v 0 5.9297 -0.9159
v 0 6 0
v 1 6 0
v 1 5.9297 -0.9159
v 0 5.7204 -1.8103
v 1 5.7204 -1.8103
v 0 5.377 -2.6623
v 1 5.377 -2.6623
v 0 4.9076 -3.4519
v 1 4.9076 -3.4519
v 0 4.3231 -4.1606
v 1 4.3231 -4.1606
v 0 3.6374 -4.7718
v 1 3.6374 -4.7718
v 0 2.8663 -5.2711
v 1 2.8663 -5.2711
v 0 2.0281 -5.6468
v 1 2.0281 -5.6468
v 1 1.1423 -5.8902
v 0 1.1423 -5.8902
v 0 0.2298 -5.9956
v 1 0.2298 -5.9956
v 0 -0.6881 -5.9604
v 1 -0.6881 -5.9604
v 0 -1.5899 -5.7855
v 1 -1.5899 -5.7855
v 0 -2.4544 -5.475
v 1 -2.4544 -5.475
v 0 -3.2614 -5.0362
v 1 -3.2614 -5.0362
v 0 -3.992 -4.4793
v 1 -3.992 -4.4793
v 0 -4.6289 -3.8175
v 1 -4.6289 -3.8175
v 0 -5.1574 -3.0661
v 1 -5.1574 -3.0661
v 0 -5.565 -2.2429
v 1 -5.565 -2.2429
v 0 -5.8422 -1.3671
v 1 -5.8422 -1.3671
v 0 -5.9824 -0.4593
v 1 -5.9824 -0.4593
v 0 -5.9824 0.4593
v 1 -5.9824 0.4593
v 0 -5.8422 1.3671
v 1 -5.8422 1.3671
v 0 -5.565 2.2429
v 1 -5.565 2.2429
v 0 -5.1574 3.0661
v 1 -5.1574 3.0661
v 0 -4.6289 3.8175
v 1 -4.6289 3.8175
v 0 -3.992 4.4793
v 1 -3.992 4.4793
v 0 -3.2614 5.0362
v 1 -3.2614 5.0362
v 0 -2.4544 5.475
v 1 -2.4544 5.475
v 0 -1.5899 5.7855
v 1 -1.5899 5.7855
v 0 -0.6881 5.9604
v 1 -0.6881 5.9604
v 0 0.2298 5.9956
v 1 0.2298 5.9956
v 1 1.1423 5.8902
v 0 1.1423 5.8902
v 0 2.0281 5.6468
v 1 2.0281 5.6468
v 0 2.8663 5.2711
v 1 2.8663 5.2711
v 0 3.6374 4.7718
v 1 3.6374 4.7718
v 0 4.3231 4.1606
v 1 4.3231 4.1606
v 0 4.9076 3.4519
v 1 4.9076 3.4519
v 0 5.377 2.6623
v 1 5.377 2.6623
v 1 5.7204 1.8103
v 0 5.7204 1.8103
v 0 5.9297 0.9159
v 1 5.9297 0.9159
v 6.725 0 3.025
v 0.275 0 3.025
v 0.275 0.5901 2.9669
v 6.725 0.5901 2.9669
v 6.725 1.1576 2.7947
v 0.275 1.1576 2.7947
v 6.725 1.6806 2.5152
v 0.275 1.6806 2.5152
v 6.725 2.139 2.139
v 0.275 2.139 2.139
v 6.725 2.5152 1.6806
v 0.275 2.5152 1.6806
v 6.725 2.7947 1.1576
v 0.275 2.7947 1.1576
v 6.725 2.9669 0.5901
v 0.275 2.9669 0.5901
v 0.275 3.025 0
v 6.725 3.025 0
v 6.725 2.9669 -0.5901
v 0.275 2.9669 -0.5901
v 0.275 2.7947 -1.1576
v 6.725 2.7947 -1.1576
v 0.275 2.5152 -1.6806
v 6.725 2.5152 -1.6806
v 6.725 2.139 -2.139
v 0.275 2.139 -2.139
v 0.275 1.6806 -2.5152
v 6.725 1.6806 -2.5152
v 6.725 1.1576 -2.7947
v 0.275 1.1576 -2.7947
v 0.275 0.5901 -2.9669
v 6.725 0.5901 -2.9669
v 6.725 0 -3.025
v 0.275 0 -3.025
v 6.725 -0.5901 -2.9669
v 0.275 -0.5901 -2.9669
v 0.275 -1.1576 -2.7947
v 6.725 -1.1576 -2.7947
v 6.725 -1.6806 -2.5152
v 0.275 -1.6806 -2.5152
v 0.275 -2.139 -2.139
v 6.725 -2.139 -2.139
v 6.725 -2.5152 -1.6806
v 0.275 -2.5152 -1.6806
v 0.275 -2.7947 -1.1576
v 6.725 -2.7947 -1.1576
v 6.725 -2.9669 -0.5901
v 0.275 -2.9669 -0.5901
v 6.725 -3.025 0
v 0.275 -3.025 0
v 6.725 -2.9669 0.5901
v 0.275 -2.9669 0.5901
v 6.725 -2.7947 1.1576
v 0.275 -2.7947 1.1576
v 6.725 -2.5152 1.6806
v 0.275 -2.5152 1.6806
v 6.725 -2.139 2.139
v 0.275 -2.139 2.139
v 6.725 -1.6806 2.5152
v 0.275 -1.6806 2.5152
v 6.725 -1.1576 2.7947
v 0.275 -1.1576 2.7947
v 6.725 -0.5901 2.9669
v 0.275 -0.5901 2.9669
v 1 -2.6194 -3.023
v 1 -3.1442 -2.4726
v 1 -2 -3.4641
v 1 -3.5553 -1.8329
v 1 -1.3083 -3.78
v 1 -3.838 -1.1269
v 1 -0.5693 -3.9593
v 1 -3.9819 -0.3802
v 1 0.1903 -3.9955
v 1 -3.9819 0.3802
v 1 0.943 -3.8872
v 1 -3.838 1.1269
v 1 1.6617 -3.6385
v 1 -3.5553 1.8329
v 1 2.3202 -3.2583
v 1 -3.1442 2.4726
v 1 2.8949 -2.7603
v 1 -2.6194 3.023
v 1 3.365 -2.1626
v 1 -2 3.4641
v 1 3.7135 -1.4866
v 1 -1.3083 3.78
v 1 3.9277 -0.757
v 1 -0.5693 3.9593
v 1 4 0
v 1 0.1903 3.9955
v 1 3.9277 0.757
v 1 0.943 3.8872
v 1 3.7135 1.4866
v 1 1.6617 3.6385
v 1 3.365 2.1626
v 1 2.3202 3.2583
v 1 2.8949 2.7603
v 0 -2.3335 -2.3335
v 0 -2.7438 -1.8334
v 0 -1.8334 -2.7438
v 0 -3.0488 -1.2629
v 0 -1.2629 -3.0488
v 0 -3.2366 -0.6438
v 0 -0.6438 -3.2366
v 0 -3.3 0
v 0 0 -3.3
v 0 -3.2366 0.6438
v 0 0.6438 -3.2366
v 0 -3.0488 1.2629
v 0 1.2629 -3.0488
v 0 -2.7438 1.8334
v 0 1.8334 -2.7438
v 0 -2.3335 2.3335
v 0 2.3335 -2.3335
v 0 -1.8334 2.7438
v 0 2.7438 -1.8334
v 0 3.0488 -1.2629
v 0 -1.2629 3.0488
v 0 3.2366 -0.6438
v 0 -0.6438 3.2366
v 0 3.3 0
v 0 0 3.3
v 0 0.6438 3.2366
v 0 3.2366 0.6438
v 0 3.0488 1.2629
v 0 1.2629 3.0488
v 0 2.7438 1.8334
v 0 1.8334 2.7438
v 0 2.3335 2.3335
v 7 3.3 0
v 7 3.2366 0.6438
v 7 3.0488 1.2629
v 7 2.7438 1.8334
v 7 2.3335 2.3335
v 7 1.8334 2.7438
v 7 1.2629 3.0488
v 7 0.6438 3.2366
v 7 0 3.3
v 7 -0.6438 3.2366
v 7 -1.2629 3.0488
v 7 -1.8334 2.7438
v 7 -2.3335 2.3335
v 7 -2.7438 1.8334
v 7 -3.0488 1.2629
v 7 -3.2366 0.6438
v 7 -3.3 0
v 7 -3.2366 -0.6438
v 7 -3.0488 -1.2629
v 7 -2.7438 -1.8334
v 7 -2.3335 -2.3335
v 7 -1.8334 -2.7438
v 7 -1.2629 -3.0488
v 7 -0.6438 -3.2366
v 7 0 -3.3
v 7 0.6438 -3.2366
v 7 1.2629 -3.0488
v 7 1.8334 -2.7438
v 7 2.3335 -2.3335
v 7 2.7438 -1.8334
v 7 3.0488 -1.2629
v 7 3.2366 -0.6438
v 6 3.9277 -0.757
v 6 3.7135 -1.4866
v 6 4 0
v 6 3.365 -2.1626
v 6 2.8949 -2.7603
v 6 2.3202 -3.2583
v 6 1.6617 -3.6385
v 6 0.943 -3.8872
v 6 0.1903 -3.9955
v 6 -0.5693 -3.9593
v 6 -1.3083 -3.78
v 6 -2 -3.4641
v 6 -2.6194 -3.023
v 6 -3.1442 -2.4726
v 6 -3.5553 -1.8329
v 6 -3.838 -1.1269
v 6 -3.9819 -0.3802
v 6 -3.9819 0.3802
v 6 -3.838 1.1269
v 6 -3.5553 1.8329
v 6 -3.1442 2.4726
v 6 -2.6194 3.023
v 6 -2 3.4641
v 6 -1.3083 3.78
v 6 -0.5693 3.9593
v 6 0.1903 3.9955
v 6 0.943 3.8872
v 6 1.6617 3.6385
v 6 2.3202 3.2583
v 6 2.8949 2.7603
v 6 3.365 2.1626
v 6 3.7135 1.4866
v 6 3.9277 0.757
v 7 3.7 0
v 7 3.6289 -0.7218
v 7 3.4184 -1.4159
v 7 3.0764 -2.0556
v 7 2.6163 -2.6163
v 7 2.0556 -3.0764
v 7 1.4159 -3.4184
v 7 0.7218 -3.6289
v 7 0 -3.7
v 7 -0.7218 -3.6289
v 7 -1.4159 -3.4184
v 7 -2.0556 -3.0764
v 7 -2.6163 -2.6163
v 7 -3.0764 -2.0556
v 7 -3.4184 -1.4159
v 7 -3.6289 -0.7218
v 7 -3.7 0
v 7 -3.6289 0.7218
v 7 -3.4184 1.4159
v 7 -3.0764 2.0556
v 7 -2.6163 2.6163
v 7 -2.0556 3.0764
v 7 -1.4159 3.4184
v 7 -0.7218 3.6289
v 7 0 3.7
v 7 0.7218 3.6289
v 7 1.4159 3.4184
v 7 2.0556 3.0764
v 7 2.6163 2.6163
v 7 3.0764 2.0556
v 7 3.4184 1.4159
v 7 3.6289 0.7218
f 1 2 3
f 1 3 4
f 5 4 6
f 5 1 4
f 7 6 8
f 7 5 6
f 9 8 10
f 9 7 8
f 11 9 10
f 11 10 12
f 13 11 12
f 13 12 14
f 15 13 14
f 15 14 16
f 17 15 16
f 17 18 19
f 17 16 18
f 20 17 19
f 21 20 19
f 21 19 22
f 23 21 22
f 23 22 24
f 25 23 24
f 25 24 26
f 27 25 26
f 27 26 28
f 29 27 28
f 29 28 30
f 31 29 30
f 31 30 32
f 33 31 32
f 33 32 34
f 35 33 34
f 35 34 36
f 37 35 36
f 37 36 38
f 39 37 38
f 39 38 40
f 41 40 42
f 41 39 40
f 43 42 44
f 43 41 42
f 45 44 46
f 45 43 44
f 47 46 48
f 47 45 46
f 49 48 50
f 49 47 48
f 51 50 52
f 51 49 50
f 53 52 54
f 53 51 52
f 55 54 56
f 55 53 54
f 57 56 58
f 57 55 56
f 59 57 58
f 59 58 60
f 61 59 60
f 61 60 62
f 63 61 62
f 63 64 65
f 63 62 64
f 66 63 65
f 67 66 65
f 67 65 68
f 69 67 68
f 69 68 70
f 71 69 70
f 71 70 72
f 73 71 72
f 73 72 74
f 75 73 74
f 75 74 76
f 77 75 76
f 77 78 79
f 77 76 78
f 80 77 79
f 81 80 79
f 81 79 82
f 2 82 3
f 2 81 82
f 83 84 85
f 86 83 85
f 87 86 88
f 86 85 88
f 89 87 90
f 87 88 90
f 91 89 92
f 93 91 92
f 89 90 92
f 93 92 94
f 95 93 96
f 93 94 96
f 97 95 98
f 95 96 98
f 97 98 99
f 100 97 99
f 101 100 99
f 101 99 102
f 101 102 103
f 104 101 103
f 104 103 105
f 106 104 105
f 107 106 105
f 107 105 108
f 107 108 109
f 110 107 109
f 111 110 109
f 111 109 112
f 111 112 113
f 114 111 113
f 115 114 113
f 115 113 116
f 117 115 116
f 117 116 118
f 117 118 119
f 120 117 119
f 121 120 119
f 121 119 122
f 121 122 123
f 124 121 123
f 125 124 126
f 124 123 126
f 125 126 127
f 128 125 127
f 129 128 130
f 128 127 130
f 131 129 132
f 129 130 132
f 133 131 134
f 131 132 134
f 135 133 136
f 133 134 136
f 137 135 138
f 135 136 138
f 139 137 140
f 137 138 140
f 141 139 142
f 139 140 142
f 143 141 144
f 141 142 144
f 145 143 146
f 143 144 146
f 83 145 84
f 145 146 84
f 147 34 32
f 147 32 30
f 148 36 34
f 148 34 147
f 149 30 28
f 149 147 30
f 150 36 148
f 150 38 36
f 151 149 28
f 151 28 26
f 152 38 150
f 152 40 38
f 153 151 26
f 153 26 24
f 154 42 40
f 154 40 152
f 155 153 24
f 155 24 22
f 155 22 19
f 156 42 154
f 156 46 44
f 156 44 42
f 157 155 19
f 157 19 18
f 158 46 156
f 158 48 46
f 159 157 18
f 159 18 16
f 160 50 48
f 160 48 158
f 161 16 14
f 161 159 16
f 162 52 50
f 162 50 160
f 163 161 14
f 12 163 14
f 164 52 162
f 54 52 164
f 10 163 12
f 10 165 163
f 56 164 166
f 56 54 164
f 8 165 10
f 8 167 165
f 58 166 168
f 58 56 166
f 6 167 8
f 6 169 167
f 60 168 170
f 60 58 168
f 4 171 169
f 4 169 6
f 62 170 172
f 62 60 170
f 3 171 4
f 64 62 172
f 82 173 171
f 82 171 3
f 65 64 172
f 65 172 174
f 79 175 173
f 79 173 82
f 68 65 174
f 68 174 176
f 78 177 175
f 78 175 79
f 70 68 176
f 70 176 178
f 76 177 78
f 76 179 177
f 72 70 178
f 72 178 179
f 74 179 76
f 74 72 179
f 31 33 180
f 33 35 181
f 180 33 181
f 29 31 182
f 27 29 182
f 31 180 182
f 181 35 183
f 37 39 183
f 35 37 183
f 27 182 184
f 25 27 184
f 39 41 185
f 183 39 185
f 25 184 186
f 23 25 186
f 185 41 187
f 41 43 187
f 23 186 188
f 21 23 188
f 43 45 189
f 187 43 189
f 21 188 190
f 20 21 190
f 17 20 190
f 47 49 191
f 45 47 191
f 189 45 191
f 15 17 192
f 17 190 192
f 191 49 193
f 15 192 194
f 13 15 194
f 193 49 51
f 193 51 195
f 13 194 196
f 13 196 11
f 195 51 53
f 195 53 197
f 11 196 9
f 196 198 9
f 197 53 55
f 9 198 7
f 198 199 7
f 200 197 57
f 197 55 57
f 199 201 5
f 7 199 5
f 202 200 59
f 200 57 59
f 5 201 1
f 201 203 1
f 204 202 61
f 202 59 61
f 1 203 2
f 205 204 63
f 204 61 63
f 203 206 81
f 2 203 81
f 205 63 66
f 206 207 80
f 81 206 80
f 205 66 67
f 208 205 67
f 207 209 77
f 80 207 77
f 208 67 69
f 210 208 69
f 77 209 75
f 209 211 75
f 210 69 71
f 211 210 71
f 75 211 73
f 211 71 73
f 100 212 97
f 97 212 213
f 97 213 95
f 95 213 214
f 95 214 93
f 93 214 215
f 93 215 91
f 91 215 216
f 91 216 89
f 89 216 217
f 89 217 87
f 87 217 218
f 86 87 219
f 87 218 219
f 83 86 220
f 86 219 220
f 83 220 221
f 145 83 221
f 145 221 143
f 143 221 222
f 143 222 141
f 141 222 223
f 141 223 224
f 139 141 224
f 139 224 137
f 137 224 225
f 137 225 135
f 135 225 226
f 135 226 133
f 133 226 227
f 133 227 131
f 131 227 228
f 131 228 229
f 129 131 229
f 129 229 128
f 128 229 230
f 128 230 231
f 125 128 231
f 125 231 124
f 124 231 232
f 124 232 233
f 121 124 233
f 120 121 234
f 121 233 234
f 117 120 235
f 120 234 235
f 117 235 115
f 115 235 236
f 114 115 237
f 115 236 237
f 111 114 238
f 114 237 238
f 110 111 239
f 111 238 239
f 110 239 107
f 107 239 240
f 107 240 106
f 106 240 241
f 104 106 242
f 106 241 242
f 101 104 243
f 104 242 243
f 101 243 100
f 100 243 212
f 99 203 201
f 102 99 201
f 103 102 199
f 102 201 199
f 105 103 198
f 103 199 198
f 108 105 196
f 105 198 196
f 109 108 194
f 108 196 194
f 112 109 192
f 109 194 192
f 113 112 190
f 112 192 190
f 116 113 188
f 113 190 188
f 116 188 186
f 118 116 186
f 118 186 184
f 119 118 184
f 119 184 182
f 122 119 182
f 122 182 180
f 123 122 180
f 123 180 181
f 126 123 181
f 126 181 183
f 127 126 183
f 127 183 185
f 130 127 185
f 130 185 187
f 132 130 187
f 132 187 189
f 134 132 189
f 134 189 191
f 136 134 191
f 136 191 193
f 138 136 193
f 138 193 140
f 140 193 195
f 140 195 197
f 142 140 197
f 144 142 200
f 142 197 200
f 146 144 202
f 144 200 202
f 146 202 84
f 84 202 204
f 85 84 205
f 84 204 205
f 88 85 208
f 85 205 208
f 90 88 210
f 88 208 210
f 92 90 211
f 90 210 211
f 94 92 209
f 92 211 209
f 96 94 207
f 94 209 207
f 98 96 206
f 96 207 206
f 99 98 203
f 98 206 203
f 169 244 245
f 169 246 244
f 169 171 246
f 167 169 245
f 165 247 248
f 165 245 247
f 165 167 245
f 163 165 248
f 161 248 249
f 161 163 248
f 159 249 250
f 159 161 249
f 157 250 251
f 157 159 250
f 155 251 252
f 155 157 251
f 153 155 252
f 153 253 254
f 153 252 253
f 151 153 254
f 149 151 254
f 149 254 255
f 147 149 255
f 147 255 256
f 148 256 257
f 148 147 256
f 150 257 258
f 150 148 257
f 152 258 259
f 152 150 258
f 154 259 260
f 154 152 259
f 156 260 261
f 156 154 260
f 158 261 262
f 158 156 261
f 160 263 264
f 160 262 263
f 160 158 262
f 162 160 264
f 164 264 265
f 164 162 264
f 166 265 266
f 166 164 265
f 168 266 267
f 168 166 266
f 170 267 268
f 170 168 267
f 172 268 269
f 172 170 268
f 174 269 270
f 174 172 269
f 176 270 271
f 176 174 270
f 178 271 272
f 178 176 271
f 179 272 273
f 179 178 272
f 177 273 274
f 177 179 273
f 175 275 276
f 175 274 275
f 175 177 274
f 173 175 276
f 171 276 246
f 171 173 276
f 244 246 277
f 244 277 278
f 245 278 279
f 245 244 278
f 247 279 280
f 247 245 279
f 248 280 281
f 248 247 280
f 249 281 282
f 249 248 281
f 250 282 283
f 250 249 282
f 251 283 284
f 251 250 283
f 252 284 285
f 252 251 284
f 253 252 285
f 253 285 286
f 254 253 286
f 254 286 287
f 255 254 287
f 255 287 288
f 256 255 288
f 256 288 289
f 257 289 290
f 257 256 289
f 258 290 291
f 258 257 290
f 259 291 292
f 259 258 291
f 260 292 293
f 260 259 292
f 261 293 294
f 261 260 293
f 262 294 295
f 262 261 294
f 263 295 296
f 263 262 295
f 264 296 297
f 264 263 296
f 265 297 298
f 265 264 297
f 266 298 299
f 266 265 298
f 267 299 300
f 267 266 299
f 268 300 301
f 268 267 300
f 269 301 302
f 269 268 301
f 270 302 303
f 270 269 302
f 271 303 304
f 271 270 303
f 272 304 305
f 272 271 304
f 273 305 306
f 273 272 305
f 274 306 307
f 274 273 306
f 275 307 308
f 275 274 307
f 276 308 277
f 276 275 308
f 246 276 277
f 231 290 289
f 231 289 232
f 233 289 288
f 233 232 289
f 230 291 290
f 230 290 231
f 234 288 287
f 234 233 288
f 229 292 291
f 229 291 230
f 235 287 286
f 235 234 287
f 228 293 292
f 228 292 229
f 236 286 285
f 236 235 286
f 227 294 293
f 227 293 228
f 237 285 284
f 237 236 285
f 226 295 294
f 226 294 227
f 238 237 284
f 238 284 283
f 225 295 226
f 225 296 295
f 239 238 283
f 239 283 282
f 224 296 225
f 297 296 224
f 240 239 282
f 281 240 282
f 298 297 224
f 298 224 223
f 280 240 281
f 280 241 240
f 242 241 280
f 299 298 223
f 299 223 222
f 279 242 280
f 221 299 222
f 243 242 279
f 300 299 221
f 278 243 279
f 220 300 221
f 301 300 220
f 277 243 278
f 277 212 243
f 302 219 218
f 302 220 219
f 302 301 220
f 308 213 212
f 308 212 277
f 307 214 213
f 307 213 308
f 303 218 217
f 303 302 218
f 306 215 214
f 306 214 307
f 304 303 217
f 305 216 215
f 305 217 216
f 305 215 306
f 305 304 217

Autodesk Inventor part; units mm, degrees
ref_plane "YZ Plane" through (0, 0, 0) normal (1, 0, 0) x (0, 1, 0)
ref_plane "XZ Plane" through (0, 0, 0) normal (0, 1, 0) x (-1, 0, 0)
ref_plane "XY Plane" through (0, 0, 0) normal (0, 0, 1) x (1, 0, 0)
sketch "Sketch_1" plane through (0, 0, 0) normal (0, 0, 1) x (1, 0, 0)
  line L0 (7, 0) -> (0, 0)
  line L1 (0, 3.3) -> (0.3, 3)
  line L2 (0.3, 3) -> (6.7, 3)
  line L3 (6.7, 3) -> (7, 3.3)
  line L4 (7, 3.3) -> (7, 3.7)
  line L5 (7, 3.7) -> (6, 4)
  line L6 (6, 4) -> (1, 4)
  line L7 (1, 4) -> (1, 6)
  line L8 (1, 6) -> (0, 6)
  line L9 (0, 6) -> (0, 3.3)
revolve "Revolution1" add sketch "Sketch_1" angle 360 about axis through (7, 0, 0) along (1, 0, 0)
sketch "스케치2" plane through (0, 0, 0) normal (-1, 0, 0) x (0, 0, 1)
  circle A0 centre (0, 0) radius 3.3 projected
  circle A1 centre (0, 0) radius 6 projected
  circle A2 centre (0, 0) radius 3.025
  dimension "d1" = 6.05
extrude "돌출1" cut sketch "스케치2" against normal up to surface (7 mm away) contours A2
properties part number "80F-0606"
